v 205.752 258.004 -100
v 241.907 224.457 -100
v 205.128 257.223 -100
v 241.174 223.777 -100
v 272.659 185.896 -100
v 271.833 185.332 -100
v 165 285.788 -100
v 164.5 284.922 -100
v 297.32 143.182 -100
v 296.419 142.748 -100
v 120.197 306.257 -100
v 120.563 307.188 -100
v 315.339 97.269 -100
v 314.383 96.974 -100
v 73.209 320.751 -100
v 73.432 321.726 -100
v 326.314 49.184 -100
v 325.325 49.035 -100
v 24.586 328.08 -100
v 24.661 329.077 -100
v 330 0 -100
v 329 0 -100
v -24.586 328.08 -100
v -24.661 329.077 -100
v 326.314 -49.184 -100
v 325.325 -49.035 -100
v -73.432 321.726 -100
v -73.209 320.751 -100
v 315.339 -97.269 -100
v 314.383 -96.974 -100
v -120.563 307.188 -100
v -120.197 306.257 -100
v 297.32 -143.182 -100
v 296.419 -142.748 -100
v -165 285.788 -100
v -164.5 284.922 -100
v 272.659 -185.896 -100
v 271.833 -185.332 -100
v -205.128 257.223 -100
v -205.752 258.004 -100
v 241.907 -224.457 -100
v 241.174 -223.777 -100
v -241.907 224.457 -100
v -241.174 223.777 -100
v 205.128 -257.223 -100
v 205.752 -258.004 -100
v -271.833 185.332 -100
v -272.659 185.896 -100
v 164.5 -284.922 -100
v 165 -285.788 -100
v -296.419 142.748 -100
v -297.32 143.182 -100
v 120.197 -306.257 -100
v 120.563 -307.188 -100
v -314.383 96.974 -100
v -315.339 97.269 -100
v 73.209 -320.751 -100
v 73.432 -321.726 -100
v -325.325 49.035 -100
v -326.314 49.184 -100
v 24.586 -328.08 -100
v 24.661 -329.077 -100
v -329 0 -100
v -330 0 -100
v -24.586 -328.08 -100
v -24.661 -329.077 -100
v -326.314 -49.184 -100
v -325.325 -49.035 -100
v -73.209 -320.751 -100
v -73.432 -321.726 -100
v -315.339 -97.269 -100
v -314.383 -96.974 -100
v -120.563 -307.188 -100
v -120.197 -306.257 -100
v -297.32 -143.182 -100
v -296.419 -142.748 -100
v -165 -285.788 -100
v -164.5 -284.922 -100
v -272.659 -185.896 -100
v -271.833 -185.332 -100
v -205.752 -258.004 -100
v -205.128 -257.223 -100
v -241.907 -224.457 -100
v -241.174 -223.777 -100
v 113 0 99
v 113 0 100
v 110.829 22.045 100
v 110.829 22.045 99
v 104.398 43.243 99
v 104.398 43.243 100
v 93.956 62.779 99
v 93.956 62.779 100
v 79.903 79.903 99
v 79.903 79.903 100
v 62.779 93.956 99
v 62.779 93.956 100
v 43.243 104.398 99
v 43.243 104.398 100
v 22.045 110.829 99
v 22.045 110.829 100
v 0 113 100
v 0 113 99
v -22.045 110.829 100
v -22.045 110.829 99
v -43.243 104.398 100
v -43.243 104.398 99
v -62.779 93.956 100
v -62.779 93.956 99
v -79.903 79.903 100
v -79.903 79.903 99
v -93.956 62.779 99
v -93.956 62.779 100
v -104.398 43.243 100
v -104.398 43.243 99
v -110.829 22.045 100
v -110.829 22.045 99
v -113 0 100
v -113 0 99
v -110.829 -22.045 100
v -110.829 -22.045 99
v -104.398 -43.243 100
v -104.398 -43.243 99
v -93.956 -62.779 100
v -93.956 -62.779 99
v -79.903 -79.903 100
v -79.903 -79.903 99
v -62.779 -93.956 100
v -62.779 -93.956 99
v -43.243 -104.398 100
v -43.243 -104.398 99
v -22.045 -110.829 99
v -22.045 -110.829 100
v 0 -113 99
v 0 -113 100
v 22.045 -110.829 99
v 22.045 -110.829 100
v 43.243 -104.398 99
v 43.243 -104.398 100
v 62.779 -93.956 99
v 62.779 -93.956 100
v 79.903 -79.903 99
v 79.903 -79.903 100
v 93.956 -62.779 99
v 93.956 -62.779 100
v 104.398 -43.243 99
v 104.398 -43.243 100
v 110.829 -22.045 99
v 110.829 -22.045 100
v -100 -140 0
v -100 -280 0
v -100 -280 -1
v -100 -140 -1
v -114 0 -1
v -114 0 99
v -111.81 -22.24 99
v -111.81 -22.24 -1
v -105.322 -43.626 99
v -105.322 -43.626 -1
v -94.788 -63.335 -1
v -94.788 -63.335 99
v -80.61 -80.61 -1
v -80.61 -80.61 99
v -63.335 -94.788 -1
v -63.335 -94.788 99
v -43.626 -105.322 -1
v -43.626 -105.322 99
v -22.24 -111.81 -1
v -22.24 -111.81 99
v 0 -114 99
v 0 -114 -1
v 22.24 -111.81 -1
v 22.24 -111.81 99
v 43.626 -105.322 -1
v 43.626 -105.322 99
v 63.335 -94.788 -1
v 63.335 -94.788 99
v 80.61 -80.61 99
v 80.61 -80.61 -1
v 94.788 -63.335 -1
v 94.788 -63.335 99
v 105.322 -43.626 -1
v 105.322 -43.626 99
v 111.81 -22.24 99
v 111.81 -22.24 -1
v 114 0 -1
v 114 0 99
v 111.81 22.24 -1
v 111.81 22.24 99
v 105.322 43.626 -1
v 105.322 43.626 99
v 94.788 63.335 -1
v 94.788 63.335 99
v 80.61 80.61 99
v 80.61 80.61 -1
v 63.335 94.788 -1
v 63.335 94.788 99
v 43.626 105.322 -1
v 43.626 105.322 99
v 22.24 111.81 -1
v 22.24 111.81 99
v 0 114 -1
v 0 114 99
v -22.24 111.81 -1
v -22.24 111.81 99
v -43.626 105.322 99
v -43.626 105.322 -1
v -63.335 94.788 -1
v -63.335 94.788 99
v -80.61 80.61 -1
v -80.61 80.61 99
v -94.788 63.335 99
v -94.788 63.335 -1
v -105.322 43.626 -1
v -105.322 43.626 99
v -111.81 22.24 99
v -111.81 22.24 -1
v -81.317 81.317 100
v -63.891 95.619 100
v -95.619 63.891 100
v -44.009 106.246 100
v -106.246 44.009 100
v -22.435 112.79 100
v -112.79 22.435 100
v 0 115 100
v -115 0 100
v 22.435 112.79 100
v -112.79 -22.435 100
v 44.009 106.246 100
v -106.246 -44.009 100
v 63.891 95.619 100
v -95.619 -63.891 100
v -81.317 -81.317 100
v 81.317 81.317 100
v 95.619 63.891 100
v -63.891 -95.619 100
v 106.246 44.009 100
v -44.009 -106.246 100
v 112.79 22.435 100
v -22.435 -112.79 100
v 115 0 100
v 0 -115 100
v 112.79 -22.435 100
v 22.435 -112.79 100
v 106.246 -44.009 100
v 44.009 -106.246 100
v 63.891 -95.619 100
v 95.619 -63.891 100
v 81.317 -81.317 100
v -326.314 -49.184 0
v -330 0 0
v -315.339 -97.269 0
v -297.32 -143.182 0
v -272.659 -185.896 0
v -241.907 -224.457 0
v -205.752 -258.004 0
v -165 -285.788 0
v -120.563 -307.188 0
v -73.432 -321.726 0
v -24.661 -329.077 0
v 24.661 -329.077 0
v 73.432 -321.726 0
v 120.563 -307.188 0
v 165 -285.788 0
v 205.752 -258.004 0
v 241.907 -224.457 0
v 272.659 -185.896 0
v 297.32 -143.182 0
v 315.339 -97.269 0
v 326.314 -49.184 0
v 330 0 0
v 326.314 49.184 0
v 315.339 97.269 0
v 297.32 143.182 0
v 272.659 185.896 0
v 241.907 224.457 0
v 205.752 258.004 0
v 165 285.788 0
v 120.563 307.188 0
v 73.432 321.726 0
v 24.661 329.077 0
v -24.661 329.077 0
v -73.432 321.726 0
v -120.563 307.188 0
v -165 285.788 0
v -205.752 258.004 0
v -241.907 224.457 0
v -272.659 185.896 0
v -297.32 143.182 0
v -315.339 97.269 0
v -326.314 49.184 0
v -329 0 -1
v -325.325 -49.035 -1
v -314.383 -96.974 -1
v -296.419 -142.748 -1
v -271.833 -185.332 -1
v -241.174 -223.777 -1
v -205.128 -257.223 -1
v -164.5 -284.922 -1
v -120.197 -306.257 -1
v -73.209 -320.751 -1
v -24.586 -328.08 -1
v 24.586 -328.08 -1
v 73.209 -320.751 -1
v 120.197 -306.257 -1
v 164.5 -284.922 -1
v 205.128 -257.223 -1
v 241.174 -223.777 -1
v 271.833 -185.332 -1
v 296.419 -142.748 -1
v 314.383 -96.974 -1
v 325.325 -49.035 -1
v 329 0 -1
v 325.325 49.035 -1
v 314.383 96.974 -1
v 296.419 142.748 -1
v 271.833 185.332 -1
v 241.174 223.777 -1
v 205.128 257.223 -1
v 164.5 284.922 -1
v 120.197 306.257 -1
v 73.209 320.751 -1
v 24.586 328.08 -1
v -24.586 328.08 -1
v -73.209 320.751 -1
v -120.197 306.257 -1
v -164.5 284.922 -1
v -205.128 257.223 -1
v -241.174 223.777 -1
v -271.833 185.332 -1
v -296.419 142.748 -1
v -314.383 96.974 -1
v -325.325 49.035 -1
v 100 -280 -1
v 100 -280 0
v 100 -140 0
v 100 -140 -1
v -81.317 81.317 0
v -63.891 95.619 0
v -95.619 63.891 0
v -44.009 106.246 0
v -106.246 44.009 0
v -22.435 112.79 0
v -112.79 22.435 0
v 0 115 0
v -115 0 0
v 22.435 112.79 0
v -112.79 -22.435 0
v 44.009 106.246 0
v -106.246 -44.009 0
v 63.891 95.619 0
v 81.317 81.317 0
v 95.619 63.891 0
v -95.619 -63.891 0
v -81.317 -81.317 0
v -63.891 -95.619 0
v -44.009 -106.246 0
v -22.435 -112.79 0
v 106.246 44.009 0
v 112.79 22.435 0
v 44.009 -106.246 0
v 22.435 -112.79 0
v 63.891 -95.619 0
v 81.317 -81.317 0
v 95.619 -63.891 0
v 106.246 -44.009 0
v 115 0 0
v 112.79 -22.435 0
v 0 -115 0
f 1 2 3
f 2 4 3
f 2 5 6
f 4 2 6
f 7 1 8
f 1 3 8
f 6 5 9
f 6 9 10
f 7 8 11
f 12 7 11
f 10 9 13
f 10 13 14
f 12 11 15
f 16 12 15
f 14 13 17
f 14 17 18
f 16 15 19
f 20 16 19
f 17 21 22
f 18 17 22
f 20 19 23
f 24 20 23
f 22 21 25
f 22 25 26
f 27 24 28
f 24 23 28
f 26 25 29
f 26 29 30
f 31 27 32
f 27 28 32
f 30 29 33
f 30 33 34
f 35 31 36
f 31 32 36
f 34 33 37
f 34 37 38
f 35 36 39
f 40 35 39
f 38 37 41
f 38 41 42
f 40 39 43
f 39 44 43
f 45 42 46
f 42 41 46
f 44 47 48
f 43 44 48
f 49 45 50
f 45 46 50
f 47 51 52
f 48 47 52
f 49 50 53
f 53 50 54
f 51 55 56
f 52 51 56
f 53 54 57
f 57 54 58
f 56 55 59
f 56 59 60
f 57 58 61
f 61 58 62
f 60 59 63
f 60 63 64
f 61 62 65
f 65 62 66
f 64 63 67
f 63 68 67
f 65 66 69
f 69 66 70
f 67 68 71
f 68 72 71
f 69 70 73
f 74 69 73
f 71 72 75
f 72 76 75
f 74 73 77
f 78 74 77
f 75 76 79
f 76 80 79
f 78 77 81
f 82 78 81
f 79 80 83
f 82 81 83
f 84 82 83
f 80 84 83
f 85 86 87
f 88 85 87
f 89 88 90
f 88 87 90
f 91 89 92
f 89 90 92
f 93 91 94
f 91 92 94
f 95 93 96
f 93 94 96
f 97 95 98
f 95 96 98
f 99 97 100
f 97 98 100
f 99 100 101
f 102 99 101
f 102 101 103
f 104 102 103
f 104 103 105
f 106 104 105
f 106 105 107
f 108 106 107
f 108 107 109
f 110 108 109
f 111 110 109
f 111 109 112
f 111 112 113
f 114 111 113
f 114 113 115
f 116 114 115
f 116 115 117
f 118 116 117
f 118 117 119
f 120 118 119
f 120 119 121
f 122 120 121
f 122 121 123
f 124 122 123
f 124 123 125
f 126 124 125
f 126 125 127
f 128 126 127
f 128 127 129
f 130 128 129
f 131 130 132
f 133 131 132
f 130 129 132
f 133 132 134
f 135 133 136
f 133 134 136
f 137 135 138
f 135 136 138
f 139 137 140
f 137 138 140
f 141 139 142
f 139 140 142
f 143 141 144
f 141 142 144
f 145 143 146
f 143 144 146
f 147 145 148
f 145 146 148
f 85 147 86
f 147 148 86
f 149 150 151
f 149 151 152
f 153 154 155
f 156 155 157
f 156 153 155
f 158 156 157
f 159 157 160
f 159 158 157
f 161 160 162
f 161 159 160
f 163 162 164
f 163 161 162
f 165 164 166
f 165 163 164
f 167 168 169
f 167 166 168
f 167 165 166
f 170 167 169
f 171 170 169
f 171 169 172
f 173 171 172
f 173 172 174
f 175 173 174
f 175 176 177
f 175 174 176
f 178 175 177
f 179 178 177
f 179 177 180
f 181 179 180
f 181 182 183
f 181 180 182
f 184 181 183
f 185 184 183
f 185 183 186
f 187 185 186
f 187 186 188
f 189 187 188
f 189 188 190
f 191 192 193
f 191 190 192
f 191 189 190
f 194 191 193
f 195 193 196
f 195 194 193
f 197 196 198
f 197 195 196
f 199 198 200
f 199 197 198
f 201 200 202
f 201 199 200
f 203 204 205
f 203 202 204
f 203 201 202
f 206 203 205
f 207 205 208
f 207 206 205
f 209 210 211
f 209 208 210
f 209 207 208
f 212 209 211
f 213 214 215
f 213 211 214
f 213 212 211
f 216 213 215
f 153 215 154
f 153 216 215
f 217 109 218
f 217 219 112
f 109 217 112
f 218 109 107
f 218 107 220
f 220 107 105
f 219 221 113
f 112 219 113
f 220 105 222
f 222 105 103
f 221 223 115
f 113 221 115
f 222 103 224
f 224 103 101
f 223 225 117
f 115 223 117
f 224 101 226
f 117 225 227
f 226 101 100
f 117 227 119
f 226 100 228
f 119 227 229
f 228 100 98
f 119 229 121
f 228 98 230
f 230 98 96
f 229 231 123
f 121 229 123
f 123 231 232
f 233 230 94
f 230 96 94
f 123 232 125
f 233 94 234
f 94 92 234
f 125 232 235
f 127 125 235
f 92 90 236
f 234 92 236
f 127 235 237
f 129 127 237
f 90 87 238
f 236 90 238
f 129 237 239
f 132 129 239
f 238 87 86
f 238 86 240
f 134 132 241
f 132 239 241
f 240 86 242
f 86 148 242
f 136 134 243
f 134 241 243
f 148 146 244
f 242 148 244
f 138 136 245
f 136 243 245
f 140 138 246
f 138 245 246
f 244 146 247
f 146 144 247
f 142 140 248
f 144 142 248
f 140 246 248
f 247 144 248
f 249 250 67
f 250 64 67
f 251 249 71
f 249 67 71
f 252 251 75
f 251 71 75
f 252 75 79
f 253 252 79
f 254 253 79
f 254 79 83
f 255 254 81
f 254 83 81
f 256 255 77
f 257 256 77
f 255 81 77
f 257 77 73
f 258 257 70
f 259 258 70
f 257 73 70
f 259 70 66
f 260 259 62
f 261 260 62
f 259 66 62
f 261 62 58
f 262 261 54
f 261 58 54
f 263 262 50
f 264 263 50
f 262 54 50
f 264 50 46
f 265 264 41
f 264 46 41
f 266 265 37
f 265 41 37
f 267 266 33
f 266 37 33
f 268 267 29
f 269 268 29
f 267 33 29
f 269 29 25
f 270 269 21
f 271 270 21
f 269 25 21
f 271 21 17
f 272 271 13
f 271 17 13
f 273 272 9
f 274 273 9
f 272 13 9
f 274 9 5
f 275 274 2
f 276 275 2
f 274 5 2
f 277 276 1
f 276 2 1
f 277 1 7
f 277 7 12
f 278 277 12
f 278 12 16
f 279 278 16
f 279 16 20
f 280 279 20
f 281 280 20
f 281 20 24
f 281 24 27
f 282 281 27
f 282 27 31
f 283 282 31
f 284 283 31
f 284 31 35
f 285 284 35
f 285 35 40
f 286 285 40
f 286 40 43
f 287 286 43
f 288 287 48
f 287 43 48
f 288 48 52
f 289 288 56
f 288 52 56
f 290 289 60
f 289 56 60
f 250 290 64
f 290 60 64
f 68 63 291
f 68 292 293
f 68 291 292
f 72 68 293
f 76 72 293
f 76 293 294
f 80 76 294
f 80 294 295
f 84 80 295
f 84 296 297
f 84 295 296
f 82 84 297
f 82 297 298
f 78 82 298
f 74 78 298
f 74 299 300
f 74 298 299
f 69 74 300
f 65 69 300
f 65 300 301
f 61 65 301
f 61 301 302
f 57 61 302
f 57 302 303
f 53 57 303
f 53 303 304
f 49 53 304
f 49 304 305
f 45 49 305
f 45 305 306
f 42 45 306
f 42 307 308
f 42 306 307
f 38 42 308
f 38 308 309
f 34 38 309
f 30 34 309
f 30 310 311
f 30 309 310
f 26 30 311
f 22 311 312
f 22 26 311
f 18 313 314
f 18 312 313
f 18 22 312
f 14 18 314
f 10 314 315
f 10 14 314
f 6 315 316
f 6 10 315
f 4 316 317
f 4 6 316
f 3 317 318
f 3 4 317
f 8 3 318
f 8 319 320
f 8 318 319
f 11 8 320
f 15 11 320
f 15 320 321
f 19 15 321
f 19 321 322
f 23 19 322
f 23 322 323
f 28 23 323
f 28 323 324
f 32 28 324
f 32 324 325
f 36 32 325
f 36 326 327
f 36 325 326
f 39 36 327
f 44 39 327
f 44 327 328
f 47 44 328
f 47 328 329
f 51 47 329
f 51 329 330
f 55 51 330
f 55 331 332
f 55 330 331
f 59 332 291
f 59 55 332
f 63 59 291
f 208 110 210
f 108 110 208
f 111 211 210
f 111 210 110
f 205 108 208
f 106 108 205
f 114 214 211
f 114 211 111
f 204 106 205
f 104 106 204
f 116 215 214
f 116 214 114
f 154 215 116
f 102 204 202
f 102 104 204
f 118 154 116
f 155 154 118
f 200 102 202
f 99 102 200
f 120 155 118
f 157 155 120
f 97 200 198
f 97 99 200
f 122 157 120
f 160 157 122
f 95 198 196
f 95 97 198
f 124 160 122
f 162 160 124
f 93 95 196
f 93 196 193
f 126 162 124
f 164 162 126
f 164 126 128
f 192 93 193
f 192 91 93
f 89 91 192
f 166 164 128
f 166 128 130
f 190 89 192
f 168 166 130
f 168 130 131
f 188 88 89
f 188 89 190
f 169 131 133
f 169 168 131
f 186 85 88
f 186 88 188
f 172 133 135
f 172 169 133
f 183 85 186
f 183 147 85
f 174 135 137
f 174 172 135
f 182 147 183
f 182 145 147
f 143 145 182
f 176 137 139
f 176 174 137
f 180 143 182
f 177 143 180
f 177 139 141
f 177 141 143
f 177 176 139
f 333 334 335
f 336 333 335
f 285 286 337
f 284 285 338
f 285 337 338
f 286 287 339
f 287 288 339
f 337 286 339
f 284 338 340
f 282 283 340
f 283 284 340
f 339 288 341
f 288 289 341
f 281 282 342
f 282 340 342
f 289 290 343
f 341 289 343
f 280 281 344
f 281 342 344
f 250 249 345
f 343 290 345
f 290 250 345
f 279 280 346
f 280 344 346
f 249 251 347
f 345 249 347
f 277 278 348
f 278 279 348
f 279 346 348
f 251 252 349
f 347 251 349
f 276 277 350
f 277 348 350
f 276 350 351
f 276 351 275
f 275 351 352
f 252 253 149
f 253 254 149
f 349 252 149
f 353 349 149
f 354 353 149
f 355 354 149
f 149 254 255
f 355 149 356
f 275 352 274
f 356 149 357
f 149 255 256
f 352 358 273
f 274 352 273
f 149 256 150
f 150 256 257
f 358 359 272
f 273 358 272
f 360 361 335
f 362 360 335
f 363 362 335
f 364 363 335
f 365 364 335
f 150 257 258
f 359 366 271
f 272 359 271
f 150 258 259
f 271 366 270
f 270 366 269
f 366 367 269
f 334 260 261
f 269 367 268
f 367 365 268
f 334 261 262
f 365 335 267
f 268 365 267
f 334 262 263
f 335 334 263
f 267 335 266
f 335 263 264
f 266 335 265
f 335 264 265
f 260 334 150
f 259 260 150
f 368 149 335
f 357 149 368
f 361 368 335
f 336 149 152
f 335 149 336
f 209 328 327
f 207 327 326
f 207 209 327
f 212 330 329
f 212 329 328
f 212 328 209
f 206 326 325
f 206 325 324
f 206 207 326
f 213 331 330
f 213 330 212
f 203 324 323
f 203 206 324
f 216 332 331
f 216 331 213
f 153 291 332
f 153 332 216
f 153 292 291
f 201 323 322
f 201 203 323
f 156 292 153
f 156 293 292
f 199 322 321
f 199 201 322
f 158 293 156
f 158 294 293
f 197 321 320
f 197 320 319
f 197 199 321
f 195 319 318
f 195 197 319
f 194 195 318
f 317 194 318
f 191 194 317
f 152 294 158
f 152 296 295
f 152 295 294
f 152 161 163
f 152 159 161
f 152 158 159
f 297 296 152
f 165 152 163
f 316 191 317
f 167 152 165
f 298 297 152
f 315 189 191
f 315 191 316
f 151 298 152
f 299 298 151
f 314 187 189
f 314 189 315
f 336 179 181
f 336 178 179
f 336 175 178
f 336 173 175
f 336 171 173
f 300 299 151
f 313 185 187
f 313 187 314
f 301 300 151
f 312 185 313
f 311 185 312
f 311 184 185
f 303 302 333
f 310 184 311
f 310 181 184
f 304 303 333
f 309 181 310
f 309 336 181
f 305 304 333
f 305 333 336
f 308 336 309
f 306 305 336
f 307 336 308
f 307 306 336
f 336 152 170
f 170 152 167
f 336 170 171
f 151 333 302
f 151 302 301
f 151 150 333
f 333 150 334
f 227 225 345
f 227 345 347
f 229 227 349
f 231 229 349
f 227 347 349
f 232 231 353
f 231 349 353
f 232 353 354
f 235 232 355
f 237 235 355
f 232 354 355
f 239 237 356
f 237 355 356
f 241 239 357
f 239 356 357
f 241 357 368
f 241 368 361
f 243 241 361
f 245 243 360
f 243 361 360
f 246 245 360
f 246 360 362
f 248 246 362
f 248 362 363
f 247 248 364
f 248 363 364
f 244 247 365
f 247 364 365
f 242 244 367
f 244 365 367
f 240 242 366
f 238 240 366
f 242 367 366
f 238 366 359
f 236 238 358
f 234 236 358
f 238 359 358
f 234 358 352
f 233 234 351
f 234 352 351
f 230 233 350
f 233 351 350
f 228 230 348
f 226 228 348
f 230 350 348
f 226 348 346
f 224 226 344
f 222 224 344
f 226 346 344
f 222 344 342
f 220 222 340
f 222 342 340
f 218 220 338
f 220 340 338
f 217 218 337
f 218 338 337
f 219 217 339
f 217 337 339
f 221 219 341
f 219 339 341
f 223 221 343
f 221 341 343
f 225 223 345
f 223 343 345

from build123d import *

# Parameters (mm, degrees)
F2_T     = -1
F3_R     = 113
F4_DEPTH = 200.001
F5_W     = 200
F5_H     = 140
F6_DEPTH = 100.001


with BuildPart() as f1:
    # F0 (on Front) → F1 (revolve)
    with BuildSketch(Plane.XZ):
        Polygon((0, 100), (-115, 100), (-115, 0), (-330, 0), (-330, -100), (0, -100), align=None)
    revolve(axis=Axis((0, 0, 94.9130495359), (0, 0, 1)))

    # F2
    f2_openings = [f1.faces().sort_by_distance(p)[0] for p in [
        (0, 0, -100),
    ]]
    offset(amount=F2_T, openings=f2_openings, kind=Kind.INTERSECTION)

    # F3 (on face) → F4 (cut, through all)
    with BuildSketch(Plane.XY.offset(100)):
        Circle(F3_R)
    extrude(amount=-F4_DEPTH, mode=Mode.SUBTRACT)

    # F5 (on face) → F6 (cut, through all)
    with BuildSketch(Plane.XY):
        with Locations((0, -210)):
            Rectangle(F5_W, F5_H)
    extrude(amount=-F6_DEPTH, mode=Mode.SUBTRACT)


solid = f1.part
